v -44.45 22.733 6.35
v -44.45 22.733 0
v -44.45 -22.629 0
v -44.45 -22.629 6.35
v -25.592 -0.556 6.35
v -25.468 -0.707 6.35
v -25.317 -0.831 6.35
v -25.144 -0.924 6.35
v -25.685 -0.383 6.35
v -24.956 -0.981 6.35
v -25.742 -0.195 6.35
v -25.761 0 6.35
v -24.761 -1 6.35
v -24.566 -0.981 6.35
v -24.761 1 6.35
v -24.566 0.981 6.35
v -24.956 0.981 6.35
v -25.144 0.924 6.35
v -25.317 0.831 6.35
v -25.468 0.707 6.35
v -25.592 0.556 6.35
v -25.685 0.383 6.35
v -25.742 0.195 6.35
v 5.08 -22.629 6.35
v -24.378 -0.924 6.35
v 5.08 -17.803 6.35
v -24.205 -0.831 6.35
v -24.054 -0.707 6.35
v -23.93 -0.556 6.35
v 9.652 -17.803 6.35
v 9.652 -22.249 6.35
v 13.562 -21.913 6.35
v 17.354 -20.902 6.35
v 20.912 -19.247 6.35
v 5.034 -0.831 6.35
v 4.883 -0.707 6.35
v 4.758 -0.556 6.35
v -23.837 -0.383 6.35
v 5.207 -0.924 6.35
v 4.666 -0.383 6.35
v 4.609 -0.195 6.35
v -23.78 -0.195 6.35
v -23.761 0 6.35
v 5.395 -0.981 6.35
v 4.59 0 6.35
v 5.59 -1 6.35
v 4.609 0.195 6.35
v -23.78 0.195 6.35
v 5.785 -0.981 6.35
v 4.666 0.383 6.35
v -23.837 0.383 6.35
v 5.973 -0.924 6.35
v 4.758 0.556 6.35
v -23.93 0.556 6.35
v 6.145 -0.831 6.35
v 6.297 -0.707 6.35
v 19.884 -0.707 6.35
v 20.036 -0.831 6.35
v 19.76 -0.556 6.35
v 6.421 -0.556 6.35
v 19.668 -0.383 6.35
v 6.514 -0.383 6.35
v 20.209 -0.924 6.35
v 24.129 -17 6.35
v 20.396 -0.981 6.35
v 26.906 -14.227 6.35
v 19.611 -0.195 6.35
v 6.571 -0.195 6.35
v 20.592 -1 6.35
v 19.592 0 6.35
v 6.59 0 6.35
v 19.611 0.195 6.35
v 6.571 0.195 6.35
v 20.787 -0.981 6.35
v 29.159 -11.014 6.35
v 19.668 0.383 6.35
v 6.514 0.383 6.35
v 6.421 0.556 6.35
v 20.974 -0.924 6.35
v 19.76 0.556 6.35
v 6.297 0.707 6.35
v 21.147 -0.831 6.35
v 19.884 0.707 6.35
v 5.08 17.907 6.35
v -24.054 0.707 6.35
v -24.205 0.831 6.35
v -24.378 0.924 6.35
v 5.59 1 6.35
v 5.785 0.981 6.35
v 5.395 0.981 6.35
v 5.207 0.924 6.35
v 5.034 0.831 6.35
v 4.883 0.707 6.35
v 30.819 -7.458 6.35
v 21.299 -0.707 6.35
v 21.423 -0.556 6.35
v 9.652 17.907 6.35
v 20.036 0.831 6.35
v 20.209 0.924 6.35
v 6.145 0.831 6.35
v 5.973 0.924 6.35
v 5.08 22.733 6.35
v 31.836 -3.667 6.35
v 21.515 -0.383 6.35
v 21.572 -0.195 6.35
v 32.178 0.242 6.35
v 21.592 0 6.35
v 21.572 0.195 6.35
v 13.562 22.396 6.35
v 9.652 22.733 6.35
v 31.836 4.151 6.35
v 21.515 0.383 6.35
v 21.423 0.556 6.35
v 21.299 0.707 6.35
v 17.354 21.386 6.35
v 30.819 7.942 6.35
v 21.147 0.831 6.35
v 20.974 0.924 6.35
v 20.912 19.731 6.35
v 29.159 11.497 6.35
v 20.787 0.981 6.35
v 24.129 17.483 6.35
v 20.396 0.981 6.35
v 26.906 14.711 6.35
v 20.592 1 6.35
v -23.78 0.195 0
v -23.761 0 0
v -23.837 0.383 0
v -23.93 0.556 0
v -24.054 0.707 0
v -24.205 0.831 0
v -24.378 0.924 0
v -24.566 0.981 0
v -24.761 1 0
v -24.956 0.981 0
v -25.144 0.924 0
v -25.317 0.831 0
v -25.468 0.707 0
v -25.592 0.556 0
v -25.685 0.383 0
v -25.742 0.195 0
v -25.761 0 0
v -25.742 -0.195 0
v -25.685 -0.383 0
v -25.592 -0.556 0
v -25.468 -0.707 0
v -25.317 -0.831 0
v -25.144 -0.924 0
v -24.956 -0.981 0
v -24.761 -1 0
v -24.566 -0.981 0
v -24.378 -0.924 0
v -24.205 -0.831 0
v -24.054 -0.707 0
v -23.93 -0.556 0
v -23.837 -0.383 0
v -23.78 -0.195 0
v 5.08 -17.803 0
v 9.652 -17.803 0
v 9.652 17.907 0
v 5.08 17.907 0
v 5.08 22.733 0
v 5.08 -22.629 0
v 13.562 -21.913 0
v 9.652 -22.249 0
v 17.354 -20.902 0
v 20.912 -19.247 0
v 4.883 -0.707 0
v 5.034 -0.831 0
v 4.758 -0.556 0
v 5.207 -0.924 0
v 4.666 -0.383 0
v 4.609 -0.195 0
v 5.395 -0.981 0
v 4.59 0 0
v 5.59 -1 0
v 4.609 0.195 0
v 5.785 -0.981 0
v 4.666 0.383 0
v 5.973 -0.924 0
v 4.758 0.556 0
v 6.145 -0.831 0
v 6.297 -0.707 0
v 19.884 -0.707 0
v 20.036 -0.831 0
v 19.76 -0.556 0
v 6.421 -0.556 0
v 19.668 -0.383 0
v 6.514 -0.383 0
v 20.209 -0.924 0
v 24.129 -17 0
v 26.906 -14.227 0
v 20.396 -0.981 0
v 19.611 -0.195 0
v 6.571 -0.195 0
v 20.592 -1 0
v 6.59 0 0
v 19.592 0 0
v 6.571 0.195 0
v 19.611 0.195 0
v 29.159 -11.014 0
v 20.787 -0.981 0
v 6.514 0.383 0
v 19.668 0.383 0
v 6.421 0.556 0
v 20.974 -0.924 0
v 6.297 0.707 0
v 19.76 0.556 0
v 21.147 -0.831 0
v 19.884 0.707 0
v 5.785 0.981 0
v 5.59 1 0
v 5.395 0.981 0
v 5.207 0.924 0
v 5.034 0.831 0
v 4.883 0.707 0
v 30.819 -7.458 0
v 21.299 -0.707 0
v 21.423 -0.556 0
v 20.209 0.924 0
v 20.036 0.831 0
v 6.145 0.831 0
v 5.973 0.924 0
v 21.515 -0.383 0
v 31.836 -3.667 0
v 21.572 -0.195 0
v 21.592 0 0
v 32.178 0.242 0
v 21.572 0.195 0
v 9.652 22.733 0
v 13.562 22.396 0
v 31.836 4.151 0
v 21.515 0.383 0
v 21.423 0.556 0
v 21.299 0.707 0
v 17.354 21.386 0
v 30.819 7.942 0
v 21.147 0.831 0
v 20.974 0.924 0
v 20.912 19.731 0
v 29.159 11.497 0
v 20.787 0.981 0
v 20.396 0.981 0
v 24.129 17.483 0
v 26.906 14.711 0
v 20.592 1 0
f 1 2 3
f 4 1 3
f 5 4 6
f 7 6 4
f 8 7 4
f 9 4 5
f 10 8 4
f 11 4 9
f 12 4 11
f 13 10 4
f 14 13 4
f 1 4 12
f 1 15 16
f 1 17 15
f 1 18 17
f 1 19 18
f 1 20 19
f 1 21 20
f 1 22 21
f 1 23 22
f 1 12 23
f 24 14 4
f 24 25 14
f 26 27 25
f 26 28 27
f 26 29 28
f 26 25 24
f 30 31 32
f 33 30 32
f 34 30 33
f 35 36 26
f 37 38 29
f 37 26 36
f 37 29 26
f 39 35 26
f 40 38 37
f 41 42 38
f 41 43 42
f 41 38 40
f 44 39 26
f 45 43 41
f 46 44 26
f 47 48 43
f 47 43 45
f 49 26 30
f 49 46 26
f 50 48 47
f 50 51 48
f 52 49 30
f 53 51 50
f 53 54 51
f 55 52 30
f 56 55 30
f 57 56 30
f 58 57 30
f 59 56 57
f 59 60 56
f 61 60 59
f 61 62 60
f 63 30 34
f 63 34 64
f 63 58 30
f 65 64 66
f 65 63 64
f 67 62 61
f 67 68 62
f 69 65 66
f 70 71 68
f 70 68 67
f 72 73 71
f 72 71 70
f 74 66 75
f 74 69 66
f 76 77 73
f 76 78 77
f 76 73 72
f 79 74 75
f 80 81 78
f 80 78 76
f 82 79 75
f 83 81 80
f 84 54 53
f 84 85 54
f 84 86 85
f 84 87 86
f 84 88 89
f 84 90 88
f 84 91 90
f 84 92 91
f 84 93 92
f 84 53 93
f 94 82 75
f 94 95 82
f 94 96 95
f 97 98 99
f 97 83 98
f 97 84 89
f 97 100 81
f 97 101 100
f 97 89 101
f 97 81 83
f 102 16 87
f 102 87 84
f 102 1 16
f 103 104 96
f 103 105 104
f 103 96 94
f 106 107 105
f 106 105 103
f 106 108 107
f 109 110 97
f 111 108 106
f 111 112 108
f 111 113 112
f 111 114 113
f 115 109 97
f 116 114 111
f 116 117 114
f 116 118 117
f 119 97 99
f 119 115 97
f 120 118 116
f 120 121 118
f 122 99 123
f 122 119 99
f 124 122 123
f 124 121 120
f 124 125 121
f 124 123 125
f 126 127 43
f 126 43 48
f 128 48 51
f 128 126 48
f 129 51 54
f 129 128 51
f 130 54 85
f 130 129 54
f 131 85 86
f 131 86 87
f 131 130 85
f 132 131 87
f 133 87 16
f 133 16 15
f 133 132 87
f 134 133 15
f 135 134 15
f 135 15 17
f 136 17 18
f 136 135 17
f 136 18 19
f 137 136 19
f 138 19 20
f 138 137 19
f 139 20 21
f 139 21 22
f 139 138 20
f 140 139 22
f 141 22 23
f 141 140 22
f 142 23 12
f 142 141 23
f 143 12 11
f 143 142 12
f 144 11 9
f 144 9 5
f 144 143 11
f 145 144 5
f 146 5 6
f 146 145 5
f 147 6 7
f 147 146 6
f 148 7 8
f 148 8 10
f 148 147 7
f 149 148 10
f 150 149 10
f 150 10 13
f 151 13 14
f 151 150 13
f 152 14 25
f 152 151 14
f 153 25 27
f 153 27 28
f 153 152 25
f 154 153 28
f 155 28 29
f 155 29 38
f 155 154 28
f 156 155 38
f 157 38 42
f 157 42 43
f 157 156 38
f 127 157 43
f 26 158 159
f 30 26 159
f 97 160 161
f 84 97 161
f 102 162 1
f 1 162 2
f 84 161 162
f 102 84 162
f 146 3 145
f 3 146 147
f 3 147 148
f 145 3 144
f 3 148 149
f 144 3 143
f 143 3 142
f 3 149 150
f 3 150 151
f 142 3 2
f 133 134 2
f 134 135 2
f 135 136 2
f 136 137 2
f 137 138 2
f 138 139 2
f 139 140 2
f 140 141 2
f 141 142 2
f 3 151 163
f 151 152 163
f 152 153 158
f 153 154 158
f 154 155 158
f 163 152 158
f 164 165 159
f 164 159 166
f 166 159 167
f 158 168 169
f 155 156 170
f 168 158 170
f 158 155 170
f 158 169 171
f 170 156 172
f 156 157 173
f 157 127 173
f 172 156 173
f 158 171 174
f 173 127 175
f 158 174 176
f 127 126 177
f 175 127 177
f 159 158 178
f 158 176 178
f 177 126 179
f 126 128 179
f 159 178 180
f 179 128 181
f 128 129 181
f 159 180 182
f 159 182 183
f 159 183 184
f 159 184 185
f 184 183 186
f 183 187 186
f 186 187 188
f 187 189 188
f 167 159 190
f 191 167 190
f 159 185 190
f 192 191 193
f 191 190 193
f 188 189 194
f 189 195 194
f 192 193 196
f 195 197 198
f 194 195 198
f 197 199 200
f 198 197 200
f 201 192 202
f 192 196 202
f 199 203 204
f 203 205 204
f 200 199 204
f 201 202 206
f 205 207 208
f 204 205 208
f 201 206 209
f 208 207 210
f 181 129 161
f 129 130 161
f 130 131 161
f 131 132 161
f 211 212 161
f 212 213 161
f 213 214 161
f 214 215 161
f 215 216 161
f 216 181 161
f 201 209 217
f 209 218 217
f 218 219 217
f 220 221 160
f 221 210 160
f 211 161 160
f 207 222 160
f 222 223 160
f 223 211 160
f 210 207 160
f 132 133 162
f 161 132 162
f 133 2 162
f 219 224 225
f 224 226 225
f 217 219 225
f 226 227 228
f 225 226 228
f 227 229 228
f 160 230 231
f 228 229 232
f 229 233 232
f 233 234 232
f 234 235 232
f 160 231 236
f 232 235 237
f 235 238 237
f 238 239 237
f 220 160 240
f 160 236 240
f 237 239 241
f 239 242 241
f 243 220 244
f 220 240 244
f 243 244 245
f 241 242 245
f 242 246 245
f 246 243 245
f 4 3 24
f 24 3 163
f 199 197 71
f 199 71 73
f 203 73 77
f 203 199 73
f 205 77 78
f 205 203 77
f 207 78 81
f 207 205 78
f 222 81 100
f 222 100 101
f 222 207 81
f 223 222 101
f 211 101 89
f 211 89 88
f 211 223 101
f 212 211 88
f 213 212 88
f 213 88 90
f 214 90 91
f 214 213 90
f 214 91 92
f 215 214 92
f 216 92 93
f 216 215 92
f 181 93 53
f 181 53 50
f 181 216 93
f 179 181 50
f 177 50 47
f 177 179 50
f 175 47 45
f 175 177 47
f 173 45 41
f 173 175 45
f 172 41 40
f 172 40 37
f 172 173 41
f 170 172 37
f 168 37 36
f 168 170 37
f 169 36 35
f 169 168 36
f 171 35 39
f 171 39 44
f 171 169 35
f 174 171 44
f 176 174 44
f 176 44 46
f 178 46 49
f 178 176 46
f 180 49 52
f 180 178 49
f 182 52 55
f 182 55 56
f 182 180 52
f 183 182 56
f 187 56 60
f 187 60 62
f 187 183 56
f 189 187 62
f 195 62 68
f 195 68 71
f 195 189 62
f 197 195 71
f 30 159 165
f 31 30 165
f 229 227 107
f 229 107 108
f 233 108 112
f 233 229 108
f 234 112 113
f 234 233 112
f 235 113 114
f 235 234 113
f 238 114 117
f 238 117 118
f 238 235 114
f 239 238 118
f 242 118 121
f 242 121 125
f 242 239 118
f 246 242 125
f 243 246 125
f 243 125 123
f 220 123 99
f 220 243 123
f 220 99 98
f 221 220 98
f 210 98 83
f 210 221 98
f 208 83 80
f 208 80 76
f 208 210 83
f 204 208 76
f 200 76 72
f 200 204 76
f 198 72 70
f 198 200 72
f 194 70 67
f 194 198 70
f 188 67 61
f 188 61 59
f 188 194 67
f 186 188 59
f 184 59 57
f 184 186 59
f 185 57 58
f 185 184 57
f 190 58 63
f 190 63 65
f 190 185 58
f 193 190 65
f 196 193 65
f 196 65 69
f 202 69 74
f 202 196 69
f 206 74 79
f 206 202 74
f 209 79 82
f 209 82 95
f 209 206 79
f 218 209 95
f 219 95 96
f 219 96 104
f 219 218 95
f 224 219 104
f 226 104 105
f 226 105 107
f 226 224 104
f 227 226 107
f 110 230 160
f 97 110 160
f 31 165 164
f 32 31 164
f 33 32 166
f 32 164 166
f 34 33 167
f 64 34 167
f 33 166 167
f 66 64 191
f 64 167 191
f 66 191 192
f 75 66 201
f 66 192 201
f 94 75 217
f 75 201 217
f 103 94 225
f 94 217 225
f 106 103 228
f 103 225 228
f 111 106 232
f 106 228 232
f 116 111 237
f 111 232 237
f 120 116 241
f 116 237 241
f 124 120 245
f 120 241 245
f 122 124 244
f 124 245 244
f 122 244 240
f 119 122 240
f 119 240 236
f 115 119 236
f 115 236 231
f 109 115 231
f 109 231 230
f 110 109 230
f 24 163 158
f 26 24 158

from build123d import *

# Parameters (mm, degrees)
F0_R     = 1
F1_DEPTH = 6.35


with BuildPart() as f1:
    # F0 (on Top) → F1 (new body)
    with BuildSketch(Plane.XY):
        with BuildLine():
            Line((-44.45, 22.732547), (-44.45, -22.6289))
            Line((-44.45, -22.6289), (5.08, -22.6289))
            Line((5.08, -22.6289), (5.08, -17.8029))
            Line((5.08, -17.8029), (9.652, -17.8029))
            Line((9.652, -17.8029), (9.652, -22.248723))
            ThreePointArc((9.652, -22.248723), (32.178133, 0.241912), (9.652, 22.732547))
            Line((9.652, 22.732547), (9.652, 17.906547))
            Line((9.652, 17.906547), (5.08, 17.906547))
            Line((5.08, 17.906547), (5.08, 22.732547))
            Line((5.08, 22.732547), (-44.45, 22.732547))
        make_face()
        with Locations((-24.760989, 0)):
            Circle(F0_R, mode=Mode.SUBTRACT)
        with Locations((5.589839, 0)):
            Circle(F0_R, mode=Mode.SUBTRACT)
        with Locations((20.59151, 0)):
            Circle(F0_R, mode=Mode.SUBTRACT)
    extrude(amount=F1_DEPTH)


solid = f1.part
